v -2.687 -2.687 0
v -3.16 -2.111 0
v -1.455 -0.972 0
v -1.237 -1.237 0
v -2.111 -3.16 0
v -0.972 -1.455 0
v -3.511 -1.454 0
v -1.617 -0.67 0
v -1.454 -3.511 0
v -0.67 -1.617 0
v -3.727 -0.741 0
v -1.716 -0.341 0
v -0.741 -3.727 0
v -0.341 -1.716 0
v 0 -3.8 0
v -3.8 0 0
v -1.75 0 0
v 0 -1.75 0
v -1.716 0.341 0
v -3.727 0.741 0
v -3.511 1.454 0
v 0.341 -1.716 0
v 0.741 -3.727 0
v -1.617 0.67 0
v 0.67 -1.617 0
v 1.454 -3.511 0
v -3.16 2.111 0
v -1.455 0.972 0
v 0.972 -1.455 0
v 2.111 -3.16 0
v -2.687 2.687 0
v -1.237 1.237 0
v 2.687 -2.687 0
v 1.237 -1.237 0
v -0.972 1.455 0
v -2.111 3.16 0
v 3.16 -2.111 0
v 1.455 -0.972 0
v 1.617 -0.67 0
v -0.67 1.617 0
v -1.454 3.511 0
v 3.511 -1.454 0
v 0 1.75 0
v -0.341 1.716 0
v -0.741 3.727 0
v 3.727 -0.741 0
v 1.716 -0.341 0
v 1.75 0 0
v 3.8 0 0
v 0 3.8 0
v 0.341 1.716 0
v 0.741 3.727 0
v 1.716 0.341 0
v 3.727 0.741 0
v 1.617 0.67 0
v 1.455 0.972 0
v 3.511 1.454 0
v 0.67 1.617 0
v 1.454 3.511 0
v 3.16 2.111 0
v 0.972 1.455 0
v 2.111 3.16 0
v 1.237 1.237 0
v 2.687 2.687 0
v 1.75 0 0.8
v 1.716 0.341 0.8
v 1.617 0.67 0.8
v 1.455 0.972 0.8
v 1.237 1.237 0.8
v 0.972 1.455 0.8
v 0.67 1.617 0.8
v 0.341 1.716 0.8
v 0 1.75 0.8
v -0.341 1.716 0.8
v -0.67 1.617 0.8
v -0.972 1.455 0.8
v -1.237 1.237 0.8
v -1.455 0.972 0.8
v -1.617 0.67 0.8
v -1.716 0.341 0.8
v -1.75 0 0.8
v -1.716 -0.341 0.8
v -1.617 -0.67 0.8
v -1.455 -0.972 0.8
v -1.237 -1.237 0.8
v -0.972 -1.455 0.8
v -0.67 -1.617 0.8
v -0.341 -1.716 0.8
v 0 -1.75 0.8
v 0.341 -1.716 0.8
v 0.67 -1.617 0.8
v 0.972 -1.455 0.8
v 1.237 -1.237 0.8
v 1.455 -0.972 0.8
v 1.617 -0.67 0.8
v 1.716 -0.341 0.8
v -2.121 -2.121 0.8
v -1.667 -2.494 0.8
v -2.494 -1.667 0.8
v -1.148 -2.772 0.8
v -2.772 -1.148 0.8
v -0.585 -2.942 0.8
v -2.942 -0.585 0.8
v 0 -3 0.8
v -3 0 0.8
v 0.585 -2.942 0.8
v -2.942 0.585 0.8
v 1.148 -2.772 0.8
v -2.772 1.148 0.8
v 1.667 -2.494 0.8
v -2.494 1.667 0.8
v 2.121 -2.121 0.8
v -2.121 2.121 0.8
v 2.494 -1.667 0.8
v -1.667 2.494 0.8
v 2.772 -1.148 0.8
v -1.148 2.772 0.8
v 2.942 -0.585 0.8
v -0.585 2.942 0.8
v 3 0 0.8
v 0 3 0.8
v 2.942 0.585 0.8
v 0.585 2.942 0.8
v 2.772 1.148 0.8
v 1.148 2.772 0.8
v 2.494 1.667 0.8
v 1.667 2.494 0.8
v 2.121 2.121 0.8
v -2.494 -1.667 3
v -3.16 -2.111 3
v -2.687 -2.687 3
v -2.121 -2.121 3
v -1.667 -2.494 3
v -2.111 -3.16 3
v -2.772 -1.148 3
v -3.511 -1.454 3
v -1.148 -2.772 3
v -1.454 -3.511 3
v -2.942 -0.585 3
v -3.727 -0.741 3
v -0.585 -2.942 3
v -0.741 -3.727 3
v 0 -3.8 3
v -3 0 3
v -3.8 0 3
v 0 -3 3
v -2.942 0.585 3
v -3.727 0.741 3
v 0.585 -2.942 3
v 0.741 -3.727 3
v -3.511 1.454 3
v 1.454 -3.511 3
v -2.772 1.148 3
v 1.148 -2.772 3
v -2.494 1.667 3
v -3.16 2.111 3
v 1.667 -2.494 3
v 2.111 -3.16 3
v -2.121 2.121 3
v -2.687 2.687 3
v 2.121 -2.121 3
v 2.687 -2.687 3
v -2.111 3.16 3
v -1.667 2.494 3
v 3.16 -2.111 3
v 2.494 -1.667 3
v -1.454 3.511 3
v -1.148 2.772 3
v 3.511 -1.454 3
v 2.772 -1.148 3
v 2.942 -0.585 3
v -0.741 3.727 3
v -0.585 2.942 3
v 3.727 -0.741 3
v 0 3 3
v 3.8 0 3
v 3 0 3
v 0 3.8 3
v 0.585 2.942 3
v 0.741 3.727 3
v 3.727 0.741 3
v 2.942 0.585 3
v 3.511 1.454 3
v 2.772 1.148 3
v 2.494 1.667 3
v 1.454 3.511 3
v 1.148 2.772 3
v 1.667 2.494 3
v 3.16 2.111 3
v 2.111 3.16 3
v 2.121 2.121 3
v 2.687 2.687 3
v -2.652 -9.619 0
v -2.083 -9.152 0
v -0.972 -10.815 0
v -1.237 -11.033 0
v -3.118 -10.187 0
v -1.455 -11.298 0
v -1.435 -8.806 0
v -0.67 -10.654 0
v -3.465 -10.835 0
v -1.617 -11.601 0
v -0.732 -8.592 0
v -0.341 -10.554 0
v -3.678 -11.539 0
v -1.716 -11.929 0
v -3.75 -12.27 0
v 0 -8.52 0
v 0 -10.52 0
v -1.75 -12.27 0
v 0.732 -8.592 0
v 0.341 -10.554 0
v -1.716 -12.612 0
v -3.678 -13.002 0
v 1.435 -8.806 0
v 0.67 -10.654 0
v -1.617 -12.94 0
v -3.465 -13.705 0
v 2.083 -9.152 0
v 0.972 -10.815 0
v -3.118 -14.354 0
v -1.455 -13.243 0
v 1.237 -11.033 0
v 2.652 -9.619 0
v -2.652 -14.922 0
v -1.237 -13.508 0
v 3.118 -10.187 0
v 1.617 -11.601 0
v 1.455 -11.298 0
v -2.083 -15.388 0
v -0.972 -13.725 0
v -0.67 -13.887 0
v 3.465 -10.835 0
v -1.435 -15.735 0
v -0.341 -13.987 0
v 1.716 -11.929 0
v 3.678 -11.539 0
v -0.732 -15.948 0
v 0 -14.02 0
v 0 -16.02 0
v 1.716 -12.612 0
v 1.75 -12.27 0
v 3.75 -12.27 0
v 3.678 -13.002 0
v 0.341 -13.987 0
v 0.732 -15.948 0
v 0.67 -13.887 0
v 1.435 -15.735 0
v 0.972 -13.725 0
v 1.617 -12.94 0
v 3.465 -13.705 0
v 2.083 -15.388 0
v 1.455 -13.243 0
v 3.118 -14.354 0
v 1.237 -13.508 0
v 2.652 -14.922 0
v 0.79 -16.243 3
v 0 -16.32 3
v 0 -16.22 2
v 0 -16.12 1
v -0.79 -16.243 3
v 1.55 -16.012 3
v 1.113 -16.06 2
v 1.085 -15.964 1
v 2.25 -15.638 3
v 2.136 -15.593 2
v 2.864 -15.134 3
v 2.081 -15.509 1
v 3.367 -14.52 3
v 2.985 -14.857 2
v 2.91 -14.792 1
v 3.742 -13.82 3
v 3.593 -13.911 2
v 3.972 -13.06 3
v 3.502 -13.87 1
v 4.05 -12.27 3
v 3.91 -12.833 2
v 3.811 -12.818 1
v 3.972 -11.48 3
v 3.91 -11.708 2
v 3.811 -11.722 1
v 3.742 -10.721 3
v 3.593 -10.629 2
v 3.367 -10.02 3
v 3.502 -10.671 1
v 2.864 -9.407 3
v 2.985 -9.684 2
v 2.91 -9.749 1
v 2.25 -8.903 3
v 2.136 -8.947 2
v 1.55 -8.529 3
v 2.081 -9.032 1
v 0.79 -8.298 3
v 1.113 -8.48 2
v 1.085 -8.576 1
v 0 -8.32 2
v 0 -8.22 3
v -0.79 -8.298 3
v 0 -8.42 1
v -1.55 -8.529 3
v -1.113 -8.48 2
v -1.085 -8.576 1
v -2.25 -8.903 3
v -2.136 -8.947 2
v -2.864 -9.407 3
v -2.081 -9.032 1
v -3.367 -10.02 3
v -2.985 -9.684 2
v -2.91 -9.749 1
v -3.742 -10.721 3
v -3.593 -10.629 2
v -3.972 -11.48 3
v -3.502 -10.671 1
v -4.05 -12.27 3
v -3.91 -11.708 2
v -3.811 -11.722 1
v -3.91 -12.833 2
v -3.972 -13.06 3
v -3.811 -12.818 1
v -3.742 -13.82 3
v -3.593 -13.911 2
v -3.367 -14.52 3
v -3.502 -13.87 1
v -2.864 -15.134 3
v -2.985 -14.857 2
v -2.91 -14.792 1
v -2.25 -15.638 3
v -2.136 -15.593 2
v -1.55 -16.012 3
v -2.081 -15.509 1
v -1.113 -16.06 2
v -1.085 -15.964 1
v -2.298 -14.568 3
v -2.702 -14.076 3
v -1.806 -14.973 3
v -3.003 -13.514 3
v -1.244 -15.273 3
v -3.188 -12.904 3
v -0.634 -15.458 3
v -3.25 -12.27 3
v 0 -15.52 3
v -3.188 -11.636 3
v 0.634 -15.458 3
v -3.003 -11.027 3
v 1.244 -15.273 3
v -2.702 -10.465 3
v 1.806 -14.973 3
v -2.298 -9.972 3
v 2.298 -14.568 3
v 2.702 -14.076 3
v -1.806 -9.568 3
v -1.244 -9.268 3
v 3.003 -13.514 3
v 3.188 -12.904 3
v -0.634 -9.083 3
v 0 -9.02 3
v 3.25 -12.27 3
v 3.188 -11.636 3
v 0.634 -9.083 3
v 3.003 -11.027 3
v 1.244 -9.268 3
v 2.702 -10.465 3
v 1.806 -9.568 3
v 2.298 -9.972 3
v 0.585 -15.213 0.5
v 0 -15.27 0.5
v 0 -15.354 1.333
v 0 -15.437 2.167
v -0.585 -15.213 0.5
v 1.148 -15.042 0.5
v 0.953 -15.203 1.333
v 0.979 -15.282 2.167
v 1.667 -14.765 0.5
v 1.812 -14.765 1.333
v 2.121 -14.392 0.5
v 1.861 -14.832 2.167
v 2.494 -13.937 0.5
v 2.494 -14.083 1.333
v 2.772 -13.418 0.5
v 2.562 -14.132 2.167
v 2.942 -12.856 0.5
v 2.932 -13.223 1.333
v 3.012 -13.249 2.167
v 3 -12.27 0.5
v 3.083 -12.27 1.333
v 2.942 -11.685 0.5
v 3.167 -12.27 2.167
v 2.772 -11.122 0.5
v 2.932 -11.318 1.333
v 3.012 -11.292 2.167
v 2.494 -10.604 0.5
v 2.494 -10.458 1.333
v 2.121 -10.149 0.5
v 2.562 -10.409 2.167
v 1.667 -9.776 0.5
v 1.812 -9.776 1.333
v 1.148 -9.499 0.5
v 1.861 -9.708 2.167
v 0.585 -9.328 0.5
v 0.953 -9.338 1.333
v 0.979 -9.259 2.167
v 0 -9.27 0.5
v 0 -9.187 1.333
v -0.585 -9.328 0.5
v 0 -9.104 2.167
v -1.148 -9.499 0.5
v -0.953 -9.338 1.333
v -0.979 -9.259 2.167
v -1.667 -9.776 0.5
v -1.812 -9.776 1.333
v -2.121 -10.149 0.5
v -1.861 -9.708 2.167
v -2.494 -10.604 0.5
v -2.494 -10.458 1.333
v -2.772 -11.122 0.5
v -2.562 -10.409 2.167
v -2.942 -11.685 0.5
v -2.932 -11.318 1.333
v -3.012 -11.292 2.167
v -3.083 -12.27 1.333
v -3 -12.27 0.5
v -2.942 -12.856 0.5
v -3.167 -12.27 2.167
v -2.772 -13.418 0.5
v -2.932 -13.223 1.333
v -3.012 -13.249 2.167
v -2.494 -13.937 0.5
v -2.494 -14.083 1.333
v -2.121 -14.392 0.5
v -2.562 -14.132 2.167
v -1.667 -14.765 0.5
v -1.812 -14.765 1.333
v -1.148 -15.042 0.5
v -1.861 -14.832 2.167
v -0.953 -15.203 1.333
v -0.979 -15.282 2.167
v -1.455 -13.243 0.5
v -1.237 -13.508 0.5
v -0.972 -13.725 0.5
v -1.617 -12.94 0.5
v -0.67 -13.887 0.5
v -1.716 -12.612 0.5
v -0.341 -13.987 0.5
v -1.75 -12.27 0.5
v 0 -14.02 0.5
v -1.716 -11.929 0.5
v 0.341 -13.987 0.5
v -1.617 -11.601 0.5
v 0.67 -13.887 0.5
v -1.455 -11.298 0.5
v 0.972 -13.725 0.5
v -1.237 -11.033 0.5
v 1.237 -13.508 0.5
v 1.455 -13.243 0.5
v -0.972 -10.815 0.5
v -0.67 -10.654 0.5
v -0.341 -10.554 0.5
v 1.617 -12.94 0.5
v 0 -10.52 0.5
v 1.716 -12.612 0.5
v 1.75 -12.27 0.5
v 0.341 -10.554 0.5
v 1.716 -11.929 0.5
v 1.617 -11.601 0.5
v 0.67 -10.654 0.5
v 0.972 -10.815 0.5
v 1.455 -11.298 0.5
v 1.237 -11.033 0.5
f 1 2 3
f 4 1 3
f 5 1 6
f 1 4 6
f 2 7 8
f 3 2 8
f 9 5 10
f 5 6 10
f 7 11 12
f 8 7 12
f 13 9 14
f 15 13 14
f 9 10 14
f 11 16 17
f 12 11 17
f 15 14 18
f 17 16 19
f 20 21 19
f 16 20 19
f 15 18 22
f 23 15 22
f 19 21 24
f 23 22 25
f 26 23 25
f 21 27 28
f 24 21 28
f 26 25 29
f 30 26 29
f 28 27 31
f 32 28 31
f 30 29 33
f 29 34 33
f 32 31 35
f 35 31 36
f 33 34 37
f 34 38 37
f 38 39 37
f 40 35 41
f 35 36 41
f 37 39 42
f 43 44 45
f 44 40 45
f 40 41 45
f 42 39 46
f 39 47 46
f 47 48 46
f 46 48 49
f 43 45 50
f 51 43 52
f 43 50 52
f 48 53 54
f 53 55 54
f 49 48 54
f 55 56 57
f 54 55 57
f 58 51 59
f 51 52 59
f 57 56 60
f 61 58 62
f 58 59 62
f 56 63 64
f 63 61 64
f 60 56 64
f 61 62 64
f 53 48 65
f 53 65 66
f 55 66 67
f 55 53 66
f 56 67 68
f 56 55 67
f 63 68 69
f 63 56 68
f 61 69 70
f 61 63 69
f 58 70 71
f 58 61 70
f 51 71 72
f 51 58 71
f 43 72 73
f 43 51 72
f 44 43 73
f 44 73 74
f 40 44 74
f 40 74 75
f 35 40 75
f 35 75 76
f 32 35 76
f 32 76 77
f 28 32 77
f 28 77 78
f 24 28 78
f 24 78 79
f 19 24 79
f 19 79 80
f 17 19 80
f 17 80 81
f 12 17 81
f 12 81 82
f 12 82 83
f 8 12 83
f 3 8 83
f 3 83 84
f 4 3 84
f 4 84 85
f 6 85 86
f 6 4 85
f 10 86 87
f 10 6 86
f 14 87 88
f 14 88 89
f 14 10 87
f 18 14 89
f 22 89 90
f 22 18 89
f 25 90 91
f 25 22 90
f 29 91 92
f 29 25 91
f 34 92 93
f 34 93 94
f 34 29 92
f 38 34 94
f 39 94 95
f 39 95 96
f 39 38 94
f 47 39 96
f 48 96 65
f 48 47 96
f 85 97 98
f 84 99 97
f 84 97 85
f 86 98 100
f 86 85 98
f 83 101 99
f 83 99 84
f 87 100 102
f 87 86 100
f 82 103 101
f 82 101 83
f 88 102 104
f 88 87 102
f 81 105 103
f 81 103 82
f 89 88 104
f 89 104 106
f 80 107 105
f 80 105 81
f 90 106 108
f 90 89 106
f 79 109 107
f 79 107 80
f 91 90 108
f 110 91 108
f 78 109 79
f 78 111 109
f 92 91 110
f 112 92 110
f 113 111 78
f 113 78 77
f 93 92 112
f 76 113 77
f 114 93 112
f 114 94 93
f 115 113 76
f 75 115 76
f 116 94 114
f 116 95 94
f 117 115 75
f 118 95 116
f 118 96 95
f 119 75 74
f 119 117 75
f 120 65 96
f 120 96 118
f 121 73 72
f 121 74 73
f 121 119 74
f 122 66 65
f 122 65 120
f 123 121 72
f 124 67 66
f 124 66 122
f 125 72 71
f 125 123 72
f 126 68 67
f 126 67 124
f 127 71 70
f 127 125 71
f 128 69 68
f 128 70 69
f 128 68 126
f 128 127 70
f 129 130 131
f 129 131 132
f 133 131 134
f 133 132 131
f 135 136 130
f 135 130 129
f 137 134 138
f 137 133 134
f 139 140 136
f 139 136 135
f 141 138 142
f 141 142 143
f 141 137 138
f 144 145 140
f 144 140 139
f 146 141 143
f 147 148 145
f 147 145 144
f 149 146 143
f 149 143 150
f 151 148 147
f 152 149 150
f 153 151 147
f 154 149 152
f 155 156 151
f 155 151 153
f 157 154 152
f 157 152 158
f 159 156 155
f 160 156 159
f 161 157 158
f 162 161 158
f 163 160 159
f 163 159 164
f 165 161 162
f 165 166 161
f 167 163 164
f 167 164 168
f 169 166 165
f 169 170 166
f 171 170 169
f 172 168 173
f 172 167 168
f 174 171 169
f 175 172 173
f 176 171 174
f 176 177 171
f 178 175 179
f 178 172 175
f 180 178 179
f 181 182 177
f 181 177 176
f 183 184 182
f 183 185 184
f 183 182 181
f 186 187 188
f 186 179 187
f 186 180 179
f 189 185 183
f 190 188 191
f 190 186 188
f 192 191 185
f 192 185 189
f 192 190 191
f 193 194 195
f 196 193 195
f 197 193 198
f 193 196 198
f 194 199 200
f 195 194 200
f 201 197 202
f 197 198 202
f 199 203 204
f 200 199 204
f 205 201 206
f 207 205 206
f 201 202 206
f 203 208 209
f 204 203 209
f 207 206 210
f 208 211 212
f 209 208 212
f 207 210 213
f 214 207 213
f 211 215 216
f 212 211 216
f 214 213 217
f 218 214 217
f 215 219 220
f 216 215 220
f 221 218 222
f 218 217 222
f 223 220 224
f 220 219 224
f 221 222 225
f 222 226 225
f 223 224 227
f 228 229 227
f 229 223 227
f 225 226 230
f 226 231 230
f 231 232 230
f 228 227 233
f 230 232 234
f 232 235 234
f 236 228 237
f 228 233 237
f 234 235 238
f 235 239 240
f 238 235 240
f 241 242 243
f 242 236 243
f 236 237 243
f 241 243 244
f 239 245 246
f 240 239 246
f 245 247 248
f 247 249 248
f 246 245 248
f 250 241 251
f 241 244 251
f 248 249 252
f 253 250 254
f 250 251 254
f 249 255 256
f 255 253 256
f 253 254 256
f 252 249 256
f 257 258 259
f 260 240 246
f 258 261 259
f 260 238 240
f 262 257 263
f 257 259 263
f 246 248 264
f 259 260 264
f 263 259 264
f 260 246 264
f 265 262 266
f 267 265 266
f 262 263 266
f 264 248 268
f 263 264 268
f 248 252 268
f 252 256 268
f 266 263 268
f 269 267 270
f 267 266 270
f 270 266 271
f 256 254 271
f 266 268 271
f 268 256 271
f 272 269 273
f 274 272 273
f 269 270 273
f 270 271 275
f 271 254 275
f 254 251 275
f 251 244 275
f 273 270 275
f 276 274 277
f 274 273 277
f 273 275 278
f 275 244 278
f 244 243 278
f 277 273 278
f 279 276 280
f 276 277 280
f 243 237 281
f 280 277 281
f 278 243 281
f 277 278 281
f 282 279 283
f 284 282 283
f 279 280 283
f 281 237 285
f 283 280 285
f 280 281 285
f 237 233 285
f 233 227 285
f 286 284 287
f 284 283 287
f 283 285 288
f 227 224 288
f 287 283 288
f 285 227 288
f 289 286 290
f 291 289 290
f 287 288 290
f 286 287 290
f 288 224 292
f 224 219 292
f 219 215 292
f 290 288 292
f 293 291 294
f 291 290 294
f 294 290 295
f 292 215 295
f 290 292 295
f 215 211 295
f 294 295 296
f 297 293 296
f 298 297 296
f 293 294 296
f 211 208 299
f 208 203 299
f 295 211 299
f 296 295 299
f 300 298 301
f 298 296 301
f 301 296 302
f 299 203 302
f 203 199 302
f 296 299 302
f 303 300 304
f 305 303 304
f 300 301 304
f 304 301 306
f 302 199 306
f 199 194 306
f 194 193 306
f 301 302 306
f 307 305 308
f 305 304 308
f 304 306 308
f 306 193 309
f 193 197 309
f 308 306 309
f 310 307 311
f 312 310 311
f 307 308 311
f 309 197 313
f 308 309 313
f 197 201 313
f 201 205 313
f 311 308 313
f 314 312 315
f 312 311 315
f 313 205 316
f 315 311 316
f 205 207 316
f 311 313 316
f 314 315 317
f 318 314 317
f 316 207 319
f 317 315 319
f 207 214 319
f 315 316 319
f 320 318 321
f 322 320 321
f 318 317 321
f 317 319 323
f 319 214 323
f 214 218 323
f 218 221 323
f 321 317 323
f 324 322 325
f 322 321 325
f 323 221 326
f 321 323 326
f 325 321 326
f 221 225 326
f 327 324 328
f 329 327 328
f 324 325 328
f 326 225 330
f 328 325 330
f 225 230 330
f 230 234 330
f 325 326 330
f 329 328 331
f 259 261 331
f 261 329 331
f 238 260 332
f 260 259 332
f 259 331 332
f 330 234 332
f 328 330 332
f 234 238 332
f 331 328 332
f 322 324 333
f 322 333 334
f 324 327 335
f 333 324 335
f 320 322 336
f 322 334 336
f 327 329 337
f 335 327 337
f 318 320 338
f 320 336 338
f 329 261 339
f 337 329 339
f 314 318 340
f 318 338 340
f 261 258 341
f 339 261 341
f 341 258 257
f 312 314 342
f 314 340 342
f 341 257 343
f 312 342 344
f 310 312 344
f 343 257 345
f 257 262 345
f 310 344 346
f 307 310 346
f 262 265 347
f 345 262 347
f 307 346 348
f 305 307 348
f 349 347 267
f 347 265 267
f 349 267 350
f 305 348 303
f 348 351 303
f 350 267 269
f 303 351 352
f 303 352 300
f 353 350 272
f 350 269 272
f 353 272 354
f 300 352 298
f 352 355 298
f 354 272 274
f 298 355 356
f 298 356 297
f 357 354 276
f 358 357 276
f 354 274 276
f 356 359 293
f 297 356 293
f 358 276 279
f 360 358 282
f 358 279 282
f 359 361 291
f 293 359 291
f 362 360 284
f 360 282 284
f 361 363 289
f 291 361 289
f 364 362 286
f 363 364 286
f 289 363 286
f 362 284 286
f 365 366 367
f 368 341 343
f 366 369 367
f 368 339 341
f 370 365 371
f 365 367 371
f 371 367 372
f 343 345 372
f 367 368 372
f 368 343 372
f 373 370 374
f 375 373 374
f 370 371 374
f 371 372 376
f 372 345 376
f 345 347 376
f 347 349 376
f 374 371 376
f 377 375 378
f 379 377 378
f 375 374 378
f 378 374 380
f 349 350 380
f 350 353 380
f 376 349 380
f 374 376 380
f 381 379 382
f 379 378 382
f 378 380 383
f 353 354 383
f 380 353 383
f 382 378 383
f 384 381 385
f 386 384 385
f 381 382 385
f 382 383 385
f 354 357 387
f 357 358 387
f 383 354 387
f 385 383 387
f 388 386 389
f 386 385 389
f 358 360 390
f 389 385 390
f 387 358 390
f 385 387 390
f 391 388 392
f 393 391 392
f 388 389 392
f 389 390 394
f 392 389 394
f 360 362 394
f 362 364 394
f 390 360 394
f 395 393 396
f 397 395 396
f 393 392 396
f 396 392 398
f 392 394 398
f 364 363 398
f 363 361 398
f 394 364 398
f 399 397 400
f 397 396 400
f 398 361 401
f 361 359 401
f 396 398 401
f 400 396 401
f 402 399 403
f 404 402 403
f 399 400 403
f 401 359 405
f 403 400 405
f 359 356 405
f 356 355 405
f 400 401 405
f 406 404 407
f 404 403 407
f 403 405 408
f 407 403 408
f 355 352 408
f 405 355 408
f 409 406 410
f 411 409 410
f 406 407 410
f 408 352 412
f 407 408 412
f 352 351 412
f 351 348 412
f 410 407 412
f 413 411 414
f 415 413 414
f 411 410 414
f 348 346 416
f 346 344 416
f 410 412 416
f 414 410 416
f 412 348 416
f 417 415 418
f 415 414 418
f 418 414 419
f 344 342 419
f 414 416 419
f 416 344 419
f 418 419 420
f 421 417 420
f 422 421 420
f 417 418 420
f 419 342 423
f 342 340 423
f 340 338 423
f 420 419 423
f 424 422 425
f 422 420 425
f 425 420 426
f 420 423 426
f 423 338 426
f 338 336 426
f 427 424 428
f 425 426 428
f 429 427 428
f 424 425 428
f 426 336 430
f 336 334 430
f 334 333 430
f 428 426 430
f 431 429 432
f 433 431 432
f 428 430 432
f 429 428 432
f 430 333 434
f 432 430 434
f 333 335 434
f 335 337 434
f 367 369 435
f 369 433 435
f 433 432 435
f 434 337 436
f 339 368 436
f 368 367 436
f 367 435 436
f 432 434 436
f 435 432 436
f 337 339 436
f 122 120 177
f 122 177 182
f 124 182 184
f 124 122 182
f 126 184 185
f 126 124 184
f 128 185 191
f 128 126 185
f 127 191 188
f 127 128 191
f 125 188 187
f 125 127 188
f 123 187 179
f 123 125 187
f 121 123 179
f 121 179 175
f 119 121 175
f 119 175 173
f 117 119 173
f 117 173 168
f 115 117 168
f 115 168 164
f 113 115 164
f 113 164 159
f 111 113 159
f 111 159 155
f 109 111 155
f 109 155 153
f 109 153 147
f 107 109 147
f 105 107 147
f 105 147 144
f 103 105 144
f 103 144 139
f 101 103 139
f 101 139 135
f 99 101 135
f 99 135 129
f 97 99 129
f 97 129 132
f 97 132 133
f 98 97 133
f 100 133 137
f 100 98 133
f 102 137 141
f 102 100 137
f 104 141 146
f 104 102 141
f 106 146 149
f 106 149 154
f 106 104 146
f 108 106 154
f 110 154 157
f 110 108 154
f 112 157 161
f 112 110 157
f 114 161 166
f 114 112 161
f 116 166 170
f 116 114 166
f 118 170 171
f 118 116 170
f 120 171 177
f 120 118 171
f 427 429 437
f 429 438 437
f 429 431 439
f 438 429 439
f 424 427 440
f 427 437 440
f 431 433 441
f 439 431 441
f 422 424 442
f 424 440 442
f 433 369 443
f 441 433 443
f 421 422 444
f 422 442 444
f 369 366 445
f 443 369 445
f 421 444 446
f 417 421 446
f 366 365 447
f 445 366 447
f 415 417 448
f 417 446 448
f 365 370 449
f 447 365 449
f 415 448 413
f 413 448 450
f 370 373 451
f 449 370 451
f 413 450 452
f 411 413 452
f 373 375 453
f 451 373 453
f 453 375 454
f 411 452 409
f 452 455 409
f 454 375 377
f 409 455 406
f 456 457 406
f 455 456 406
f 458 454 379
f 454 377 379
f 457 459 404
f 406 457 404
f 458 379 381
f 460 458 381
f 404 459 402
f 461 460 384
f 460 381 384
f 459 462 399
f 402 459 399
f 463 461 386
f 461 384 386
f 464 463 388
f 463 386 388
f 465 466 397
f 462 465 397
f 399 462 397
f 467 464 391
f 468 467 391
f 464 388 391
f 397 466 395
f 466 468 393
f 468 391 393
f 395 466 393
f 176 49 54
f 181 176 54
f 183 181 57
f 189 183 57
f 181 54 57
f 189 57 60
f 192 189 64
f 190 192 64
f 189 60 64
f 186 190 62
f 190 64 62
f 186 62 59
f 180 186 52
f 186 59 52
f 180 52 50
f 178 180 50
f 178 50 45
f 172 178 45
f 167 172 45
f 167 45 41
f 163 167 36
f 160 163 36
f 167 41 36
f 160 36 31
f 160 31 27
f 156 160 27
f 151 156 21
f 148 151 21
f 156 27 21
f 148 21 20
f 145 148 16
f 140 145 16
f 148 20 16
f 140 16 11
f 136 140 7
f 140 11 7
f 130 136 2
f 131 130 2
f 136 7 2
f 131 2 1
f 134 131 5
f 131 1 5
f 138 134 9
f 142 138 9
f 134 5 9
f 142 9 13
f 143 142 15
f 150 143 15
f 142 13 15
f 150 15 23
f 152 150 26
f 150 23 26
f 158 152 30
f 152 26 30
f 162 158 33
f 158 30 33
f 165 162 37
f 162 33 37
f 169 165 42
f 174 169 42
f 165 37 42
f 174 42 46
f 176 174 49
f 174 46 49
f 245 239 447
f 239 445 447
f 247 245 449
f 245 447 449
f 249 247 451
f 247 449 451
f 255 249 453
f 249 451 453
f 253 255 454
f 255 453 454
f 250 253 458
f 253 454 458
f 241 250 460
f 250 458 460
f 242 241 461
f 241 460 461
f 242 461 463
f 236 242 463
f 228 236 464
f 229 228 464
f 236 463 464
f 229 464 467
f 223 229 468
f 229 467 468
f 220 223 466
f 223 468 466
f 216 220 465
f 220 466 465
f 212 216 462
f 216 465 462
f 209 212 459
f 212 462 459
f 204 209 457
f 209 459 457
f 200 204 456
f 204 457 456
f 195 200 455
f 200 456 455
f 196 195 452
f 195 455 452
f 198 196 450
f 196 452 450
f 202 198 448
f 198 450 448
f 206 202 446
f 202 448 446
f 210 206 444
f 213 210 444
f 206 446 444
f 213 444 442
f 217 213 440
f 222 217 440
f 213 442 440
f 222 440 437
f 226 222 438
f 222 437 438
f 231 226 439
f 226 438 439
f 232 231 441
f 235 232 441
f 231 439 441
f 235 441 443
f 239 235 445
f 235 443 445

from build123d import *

# Parameters (mm, degrees)
F0_R     = 3.8
F0_R_2   = 1.75
F1_DEPTH = 3
F2_T     = -0.8


with BuildPart() as f1:
    # F0 (on Top) → F1 (new body)
    with BuildSketch(Plane.XY):
        Circle(F0_R)
        Circle(F0_R_2, mode=Mode.SUBTRACT)
    extrude(amount=F1_DEPTH)

    # F2
    f2_openings = [f1.faces().sort_by_distance(p)[0] for p in [
        (-3.69252, 0, 3),
        (-1.75, 0, 1.5),
    ]]
    offset(amount=F2_T, openings=f2_openings)


with BuildPart() as f4:
    # F3 (on Right) → F4 (revolve)
    with BuildSketch(Plane.YZ):
        Polygon((-15.220374, 0), (-14.020374, 0), (-14.020374, 0.5), (-15.270374, 0.5), (-15.520374, 3), (-16.320374, 3), (-16.020374, 0), align=None)
    revolve(axis=Axis((0, -12.270374, 2.215799), (0, 0, 1)))


solid = Compound([f1.part, f4.part])
